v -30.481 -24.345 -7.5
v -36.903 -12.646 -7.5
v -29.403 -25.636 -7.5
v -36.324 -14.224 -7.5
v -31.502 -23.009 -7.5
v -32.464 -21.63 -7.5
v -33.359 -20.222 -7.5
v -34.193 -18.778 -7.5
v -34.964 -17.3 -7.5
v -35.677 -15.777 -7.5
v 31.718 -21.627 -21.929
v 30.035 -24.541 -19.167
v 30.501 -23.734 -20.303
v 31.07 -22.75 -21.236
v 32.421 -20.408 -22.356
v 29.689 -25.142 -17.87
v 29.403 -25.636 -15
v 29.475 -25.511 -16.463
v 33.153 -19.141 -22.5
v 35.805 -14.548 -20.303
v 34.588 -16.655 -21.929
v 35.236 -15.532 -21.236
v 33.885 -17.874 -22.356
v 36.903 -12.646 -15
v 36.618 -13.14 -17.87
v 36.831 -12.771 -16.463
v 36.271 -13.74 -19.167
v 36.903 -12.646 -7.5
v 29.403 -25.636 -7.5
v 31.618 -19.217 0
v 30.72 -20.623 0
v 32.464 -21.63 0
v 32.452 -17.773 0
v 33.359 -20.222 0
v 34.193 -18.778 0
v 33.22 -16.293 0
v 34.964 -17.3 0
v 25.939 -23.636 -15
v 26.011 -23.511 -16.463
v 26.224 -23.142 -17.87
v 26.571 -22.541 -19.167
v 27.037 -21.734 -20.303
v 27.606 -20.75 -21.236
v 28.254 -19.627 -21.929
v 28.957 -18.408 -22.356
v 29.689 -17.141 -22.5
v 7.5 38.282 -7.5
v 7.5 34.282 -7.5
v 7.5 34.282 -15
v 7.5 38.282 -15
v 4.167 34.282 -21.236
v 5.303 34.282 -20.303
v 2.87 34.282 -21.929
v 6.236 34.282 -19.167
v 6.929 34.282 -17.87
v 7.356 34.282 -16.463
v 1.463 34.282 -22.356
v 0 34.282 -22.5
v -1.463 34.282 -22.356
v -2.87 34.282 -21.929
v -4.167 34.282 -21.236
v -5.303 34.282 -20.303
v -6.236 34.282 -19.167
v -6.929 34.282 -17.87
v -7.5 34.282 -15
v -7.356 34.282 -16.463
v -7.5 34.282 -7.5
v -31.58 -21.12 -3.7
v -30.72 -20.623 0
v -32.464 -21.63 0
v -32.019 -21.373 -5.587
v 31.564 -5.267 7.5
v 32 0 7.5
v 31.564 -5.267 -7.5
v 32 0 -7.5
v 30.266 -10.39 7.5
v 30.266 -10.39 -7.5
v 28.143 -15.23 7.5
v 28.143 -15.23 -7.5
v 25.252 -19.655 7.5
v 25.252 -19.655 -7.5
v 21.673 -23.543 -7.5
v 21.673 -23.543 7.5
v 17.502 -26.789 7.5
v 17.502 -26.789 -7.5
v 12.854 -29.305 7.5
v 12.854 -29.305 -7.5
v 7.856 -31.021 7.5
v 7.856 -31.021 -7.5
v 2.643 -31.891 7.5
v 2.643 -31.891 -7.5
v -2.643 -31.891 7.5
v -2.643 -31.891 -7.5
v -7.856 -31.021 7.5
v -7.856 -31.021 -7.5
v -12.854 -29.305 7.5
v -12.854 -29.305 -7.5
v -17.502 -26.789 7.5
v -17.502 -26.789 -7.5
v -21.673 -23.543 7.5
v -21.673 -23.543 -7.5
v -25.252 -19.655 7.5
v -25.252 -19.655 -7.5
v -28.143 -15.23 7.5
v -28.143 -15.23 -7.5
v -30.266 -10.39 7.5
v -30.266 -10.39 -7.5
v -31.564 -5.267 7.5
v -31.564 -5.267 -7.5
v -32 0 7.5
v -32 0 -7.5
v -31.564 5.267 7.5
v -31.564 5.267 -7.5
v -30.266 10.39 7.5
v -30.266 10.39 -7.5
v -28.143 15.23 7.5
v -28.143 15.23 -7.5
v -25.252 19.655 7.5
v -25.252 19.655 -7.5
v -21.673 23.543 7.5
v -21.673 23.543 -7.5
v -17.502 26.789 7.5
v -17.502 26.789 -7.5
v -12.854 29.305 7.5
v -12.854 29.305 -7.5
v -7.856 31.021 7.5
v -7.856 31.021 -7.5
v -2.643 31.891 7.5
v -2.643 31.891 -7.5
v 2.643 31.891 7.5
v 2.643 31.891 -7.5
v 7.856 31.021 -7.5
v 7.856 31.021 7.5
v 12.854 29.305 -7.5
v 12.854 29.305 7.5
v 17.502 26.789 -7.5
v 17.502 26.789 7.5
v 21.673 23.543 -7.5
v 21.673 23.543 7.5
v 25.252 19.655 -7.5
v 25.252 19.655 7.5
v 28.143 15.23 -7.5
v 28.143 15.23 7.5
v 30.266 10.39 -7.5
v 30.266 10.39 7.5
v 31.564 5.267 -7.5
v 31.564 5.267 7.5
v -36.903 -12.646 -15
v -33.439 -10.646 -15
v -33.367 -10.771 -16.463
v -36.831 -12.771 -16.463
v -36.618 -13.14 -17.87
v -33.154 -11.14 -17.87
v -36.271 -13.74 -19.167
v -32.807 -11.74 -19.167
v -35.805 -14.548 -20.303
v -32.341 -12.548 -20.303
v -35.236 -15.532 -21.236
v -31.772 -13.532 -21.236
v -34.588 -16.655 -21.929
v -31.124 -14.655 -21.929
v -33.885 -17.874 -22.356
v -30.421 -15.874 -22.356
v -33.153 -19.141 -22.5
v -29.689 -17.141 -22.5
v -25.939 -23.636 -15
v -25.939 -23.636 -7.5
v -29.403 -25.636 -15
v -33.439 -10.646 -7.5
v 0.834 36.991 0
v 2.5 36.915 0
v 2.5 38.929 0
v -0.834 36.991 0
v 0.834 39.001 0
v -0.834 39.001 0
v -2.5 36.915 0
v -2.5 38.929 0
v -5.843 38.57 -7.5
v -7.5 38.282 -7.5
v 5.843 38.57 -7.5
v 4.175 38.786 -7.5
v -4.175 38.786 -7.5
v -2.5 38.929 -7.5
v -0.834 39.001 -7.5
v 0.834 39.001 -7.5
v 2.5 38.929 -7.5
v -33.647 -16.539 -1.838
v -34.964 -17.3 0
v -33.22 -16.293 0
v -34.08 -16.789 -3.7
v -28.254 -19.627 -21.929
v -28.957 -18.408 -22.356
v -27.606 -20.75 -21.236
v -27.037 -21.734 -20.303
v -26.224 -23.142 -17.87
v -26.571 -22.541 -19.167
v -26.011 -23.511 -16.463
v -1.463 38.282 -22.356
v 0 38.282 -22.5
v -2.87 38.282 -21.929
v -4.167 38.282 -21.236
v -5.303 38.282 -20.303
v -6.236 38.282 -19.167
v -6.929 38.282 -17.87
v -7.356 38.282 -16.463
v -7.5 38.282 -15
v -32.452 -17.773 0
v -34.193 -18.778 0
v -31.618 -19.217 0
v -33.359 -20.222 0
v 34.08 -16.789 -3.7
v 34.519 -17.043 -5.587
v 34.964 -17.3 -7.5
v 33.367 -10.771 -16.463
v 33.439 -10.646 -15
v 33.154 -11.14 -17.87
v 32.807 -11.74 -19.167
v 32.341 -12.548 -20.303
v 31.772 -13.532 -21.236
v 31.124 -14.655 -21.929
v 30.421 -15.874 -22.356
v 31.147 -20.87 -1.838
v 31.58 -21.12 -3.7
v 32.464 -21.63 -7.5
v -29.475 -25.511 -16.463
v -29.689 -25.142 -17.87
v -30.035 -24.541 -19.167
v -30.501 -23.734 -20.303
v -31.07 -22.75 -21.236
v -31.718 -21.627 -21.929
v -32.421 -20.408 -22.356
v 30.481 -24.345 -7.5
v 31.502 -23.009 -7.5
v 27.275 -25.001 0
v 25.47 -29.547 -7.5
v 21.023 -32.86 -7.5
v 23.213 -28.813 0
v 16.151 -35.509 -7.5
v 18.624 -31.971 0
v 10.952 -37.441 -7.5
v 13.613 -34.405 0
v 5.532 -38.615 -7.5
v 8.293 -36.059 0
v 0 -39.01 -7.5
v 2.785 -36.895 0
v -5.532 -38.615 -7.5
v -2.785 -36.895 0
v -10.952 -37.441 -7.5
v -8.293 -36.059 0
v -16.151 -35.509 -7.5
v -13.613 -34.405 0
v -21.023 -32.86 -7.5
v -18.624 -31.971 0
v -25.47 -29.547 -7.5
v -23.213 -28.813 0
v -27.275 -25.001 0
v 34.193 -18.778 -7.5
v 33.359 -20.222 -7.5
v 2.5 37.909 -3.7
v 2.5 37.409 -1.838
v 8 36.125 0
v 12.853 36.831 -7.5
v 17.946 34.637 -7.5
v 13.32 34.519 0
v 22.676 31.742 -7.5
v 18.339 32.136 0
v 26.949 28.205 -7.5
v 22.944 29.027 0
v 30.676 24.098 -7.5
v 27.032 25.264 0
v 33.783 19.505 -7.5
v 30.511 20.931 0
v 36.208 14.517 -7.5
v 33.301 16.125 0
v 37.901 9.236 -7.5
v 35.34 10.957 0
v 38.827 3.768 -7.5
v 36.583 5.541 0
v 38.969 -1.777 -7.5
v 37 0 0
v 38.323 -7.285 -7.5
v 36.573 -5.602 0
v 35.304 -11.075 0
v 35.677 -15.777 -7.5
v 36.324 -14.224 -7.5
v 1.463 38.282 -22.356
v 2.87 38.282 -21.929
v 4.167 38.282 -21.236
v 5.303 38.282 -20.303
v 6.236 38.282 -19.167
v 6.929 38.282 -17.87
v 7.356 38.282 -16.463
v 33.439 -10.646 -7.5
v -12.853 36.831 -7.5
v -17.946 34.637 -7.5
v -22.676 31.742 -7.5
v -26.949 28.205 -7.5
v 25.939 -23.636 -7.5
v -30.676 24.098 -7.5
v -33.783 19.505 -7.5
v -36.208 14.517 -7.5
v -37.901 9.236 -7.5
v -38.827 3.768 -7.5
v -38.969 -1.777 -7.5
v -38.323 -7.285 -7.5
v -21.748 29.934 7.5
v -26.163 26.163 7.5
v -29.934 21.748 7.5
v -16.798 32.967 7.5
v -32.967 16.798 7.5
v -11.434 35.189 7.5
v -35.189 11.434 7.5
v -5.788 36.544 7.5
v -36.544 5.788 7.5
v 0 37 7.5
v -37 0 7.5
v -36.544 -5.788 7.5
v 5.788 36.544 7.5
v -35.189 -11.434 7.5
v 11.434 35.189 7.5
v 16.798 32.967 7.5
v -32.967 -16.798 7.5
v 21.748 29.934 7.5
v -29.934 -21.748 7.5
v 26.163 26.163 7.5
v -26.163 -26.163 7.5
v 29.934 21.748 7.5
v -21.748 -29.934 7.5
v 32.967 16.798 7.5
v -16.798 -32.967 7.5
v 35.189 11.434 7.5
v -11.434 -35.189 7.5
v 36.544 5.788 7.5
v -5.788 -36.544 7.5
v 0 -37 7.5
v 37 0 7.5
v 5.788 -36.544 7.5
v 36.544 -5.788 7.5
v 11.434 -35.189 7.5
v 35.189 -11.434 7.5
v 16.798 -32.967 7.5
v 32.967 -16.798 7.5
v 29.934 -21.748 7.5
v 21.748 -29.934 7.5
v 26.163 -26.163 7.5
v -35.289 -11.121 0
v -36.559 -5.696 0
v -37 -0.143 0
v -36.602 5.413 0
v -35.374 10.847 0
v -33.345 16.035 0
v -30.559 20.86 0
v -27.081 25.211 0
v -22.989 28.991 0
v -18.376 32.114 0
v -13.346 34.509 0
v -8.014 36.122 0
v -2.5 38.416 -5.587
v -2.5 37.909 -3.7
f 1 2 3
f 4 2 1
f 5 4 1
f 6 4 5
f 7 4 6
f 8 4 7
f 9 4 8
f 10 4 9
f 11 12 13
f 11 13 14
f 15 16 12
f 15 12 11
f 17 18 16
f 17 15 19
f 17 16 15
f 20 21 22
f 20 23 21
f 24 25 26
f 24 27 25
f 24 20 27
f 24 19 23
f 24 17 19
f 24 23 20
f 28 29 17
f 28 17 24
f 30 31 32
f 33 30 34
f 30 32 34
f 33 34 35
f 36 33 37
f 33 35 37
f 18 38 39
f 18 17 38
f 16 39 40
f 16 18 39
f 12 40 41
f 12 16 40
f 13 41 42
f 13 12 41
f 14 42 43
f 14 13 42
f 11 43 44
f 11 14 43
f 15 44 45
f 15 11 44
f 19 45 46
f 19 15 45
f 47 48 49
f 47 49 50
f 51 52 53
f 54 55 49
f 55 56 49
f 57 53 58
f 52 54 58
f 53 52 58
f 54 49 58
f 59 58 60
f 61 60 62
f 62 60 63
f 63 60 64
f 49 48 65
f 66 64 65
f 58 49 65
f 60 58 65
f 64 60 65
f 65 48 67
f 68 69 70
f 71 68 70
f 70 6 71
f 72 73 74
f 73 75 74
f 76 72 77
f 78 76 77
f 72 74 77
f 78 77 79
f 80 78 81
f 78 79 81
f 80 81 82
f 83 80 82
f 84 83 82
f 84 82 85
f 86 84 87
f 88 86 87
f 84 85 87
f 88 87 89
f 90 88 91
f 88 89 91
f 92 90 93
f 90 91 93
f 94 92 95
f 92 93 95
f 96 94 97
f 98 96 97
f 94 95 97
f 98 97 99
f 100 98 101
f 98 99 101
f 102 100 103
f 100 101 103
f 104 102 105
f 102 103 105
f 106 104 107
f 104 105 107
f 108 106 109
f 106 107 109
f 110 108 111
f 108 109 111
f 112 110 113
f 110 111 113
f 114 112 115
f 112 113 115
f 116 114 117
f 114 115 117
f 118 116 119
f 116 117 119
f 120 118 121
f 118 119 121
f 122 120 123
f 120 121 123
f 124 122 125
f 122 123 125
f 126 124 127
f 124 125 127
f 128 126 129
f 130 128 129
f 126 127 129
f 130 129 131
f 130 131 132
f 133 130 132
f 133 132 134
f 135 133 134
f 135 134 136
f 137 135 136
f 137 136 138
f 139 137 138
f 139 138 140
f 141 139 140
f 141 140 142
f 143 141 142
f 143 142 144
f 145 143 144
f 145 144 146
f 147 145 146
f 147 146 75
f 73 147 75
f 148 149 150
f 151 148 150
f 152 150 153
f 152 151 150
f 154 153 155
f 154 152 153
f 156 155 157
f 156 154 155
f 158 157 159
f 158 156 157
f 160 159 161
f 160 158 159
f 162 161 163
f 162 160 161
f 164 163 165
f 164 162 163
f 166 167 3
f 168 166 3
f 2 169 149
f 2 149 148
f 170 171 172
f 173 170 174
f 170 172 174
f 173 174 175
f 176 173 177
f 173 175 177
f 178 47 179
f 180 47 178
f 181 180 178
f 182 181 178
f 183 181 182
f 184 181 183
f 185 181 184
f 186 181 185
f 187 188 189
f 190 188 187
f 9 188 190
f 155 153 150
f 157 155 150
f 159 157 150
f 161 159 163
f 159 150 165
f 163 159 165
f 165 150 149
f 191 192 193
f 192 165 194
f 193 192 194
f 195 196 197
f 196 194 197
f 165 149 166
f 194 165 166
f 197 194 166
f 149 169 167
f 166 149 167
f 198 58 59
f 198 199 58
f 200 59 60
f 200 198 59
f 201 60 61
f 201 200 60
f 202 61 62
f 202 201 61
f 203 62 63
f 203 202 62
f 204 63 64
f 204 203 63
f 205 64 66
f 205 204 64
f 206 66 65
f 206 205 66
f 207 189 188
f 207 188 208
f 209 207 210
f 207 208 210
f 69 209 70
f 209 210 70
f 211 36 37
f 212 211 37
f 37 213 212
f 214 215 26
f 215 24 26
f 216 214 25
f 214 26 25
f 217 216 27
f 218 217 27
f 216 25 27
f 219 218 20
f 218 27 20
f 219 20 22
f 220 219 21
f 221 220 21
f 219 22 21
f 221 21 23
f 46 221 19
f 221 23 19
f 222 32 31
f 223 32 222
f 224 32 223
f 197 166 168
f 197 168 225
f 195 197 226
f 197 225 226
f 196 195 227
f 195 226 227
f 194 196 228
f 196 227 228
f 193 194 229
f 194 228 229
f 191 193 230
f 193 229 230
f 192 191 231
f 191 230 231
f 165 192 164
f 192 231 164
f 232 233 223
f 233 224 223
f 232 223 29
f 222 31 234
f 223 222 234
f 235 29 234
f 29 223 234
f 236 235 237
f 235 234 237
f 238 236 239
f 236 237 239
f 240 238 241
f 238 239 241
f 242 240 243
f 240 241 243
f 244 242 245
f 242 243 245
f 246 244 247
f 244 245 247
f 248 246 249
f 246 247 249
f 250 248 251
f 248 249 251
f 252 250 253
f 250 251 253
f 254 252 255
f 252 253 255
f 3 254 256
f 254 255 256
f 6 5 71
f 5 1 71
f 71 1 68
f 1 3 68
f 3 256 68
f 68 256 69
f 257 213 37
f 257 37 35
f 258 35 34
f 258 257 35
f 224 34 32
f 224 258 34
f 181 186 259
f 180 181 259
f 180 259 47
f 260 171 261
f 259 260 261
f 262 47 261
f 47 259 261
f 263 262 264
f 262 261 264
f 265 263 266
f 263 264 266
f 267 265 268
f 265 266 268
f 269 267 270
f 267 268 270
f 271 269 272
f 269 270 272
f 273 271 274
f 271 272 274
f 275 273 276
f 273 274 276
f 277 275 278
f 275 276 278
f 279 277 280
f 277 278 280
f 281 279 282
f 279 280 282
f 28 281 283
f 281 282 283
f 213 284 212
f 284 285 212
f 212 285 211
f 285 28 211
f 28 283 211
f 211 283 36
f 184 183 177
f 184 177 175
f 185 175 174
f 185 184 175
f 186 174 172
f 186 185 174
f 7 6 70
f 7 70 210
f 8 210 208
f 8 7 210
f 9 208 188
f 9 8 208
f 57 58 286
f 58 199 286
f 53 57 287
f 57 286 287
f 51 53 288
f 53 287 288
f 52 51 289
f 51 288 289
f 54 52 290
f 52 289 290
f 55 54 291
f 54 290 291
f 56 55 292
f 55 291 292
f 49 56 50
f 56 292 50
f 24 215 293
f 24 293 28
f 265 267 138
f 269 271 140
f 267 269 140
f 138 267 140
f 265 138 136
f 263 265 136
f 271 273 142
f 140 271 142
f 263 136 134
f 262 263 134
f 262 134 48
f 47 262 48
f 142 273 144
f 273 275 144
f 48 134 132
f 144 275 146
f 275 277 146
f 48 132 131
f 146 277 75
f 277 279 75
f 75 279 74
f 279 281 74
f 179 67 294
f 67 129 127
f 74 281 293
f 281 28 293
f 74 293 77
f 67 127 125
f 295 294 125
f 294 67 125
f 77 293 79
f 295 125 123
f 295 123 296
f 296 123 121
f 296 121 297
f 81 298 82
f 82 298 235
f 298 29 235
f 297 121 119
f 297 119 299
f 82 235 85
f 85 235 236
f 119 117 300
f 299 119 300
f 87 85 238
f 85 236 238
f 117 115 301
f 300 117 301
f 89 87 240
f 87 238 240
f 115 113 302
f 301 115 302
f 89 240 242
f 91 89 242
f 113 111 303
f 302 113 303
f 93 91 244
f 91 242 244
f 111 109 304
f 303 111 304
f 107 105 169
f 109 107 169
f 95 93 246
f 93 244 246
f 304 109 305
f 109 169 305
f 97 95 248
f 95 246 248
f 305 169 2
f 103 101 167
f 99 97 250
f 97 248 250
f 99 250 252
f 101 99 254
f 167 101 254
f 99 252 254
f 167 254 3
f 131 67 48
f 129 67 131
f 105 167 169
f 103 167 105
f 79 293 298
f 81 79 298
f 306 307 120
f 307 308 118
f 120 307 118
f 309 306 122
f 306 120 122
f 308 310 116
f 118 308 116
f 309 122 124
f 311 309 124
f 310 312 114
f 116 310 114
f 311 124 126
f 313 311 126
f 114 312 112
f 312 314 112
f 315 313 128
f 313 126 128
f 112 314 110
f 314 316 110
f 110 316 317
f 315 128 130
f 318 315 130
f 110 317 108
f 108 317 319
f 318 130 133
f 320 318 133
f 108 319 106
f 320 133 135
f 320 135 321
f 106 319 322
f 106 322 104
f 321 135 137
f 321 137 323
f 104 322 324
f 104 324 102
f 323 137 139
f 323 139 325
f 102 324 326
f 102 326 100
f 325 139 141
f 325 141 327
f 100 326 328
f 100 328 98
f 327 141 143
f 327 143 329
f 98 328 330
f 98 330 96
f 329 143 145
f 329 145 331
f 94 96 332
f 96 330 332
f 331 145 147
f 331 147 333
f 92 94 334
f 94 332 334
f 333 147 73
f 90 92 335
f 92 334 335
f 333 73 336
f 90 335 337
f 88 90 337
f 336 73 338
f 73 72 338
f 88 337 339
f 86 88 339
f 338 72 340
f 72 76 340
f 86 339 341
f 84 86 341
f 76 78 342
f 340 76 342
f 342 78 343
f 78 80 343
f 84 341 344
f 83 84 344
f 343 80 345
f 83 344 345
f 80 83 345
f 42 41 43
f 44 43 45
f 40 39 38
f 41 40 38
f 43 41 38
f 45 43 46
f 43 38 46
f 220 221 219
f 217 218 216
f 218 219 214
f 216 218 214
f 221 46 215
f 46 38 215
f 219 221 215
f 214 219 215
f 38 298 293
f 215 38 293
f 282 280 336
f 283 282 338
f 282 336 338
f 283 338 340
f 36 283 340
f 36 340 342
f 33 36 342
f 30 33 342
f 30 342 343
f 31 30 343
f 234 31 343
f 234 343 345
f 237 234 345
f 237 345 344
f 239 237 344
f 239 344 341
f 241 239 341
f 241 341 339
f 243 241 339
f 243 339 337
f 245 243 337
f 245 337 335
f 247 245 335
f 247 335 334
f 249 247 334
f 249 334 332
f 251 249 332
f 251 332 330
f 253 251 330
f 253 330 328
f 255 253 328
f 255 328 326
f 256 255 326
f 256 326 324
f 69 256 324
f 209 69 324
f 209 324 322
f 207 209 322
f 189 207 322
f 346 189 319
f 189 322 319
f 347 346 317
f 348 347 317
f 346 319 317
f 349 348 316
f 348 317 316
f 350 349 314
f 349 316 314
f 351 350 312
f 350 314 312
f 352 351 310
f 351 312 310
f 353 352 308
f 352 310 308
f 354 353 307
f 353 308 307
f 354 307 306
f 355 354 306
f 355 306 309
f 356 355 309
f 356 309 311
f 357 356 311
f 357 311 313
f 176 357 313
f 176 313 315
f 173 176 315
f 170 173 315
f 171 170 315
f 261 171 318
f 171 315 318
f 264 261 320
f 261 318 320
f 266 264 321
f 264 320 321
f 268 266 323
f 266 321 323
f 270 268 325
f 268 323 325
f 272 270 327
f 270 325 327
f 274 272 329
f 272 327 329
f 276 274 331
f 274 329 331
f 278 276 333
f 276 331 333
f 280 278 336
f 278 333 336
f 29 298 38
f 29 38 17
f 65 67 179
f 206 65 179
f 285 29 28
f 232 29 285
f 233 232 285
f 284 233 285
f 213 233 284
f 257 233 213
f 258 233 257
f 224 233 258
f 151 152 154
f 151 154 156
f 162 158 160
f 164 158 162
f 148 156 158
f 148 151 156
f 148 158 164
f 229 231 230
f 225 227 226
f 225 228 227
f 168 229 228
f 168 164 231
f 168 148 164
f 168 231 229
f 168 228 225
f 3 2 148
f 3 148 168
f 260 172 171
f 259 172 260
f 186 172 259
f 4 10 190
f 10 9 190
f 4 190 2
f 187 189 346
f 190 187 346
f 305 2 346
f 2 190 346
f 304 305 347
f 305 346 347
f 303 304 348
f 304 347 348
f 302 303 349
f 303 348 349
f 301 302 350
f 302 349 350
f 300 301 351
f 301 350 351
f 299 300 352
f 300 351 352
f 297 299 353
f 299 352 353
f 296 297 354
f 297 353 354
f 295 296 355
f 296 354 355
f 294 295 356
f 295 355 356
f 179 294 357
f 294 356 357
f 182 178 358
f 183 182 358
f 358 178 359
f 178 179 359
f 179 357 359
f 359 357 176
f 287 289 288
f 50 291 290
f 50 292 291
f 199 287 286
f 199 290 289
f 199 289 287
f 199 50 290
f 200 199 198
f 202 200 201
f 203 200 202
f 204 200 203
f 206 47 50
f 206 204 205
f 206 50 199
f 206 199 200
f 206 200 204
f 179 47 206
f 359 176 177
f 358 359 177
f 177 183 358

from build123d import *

# Parameters (mm, degrees)
BOSS_EXTRUDE1_DEPTH      = 7.5
SKETCH6_W                = 15
SKETCH6_H                = 4
BOSS_EXTRUDE2_DEPTH      = 15
FILLET1_R                = 7.5
CIRPATTERN1_COUNT        = 3
FILLET1_OF_CIRPATTERN1_R = 7.5


with BuildPart() as part:
    # Sketch2 → Revolve1 (revolve)
    with BuildSketch(Plane(origin=(0, 0, 0), x_dir=(1, 0, 0), z_dir=(0, 1, 0))):
        Polygon((37, 0), (37, -7.5), (32, -7.5), (32, 7.5), (39.009618943, 7.5), align=None)
    revolve(axis=Axis((0, 0, 7.5), (0, 0, -1)))

    # Sketch3 → Boss-Extrude1 (add)
    with BuildSketch(Plane(origin=(0, 0, -7.5), x_dir=(-1, 0, 0), z_dir=(0, 0, -1))):
        with BuildLine():
            Line((-2.5, 38.929428073), (-2.5, 33.929428073))
            Line((-2.5, 33.929428073), (2.5, 33.929428073))
            Line((2.5, 33.929428073), (2.5, 38.929428073))
            ThreePointArc((2.5, 38.929428073), (0, 39.009618943), (-2.5, 38.929428073))
        make_face()
    boss_extrude1 = extrude(amount=-BOSS_EXTRUDE1_DEPTH)

    # Sketch6 → Boss-Extrude2 (add)
    with BuildSketch(Plane(origin=(0, 0, -7.5), x_dir=(-1, 0, 0), z_dir=(0, 0, -1))):
        with Locations((0, 36.281854319)):
            Rectangle(SKETCH6_W, SKETCH6_H)
    boss_extrude2 = extrude(amount=BOSS_EXTRUDE2_DEPTH)

    # Fillet1
    fillet1_edges = [part.edges().sort_by_distance(p)[0] for p in [
        (-7.5, 36.281854319, -22.5),
        (7.5, 36.281854319, -22.5),
    ]]
    fillet(fillet1_edges, radius=FILLET1_R - 0.0001)  # a hair under: the kernel refuses the full size

    # CirPattern1: Boss-Extrude1, Boss-Extrude2 ×3 about axis
    cirpattern1_axis = Axis((0, 0, 0), (0, 0, 1))
    add([boss_extrude1.rotate(cirpattern1_axis, i * 360 / CIRPATTERN1_COUNT) for i in range(1, CIRPATTERN1_COUNT)])
    add([boss_extrude2.rotate(cirpattern1_axis, i * 360 / CIRPATTERN1_COUNT) for i in range(1, CIRPATTERN1_COUNT)])

    # Fillet1 of CirPattern1
    fillet1_of_cirpattern1_edges = [part.edges().sort_by_distance(p)[0] for p in [
        (-27.671007537, -24.636117688, -22.5),
        (-35.171007537, -11.645736631, -22.5),
        (35.171007537, -11.645736631, -22.5),
        (27.671007537, -24.636117688, -22.5),
    ]]
    fillet(fillet1_of_cirpattern1_edges, radius=FILLET1_OF_CIRPATTERN1_R - 0.0001)  # a hair under: the kernel refuses the full size


solid = part.part
